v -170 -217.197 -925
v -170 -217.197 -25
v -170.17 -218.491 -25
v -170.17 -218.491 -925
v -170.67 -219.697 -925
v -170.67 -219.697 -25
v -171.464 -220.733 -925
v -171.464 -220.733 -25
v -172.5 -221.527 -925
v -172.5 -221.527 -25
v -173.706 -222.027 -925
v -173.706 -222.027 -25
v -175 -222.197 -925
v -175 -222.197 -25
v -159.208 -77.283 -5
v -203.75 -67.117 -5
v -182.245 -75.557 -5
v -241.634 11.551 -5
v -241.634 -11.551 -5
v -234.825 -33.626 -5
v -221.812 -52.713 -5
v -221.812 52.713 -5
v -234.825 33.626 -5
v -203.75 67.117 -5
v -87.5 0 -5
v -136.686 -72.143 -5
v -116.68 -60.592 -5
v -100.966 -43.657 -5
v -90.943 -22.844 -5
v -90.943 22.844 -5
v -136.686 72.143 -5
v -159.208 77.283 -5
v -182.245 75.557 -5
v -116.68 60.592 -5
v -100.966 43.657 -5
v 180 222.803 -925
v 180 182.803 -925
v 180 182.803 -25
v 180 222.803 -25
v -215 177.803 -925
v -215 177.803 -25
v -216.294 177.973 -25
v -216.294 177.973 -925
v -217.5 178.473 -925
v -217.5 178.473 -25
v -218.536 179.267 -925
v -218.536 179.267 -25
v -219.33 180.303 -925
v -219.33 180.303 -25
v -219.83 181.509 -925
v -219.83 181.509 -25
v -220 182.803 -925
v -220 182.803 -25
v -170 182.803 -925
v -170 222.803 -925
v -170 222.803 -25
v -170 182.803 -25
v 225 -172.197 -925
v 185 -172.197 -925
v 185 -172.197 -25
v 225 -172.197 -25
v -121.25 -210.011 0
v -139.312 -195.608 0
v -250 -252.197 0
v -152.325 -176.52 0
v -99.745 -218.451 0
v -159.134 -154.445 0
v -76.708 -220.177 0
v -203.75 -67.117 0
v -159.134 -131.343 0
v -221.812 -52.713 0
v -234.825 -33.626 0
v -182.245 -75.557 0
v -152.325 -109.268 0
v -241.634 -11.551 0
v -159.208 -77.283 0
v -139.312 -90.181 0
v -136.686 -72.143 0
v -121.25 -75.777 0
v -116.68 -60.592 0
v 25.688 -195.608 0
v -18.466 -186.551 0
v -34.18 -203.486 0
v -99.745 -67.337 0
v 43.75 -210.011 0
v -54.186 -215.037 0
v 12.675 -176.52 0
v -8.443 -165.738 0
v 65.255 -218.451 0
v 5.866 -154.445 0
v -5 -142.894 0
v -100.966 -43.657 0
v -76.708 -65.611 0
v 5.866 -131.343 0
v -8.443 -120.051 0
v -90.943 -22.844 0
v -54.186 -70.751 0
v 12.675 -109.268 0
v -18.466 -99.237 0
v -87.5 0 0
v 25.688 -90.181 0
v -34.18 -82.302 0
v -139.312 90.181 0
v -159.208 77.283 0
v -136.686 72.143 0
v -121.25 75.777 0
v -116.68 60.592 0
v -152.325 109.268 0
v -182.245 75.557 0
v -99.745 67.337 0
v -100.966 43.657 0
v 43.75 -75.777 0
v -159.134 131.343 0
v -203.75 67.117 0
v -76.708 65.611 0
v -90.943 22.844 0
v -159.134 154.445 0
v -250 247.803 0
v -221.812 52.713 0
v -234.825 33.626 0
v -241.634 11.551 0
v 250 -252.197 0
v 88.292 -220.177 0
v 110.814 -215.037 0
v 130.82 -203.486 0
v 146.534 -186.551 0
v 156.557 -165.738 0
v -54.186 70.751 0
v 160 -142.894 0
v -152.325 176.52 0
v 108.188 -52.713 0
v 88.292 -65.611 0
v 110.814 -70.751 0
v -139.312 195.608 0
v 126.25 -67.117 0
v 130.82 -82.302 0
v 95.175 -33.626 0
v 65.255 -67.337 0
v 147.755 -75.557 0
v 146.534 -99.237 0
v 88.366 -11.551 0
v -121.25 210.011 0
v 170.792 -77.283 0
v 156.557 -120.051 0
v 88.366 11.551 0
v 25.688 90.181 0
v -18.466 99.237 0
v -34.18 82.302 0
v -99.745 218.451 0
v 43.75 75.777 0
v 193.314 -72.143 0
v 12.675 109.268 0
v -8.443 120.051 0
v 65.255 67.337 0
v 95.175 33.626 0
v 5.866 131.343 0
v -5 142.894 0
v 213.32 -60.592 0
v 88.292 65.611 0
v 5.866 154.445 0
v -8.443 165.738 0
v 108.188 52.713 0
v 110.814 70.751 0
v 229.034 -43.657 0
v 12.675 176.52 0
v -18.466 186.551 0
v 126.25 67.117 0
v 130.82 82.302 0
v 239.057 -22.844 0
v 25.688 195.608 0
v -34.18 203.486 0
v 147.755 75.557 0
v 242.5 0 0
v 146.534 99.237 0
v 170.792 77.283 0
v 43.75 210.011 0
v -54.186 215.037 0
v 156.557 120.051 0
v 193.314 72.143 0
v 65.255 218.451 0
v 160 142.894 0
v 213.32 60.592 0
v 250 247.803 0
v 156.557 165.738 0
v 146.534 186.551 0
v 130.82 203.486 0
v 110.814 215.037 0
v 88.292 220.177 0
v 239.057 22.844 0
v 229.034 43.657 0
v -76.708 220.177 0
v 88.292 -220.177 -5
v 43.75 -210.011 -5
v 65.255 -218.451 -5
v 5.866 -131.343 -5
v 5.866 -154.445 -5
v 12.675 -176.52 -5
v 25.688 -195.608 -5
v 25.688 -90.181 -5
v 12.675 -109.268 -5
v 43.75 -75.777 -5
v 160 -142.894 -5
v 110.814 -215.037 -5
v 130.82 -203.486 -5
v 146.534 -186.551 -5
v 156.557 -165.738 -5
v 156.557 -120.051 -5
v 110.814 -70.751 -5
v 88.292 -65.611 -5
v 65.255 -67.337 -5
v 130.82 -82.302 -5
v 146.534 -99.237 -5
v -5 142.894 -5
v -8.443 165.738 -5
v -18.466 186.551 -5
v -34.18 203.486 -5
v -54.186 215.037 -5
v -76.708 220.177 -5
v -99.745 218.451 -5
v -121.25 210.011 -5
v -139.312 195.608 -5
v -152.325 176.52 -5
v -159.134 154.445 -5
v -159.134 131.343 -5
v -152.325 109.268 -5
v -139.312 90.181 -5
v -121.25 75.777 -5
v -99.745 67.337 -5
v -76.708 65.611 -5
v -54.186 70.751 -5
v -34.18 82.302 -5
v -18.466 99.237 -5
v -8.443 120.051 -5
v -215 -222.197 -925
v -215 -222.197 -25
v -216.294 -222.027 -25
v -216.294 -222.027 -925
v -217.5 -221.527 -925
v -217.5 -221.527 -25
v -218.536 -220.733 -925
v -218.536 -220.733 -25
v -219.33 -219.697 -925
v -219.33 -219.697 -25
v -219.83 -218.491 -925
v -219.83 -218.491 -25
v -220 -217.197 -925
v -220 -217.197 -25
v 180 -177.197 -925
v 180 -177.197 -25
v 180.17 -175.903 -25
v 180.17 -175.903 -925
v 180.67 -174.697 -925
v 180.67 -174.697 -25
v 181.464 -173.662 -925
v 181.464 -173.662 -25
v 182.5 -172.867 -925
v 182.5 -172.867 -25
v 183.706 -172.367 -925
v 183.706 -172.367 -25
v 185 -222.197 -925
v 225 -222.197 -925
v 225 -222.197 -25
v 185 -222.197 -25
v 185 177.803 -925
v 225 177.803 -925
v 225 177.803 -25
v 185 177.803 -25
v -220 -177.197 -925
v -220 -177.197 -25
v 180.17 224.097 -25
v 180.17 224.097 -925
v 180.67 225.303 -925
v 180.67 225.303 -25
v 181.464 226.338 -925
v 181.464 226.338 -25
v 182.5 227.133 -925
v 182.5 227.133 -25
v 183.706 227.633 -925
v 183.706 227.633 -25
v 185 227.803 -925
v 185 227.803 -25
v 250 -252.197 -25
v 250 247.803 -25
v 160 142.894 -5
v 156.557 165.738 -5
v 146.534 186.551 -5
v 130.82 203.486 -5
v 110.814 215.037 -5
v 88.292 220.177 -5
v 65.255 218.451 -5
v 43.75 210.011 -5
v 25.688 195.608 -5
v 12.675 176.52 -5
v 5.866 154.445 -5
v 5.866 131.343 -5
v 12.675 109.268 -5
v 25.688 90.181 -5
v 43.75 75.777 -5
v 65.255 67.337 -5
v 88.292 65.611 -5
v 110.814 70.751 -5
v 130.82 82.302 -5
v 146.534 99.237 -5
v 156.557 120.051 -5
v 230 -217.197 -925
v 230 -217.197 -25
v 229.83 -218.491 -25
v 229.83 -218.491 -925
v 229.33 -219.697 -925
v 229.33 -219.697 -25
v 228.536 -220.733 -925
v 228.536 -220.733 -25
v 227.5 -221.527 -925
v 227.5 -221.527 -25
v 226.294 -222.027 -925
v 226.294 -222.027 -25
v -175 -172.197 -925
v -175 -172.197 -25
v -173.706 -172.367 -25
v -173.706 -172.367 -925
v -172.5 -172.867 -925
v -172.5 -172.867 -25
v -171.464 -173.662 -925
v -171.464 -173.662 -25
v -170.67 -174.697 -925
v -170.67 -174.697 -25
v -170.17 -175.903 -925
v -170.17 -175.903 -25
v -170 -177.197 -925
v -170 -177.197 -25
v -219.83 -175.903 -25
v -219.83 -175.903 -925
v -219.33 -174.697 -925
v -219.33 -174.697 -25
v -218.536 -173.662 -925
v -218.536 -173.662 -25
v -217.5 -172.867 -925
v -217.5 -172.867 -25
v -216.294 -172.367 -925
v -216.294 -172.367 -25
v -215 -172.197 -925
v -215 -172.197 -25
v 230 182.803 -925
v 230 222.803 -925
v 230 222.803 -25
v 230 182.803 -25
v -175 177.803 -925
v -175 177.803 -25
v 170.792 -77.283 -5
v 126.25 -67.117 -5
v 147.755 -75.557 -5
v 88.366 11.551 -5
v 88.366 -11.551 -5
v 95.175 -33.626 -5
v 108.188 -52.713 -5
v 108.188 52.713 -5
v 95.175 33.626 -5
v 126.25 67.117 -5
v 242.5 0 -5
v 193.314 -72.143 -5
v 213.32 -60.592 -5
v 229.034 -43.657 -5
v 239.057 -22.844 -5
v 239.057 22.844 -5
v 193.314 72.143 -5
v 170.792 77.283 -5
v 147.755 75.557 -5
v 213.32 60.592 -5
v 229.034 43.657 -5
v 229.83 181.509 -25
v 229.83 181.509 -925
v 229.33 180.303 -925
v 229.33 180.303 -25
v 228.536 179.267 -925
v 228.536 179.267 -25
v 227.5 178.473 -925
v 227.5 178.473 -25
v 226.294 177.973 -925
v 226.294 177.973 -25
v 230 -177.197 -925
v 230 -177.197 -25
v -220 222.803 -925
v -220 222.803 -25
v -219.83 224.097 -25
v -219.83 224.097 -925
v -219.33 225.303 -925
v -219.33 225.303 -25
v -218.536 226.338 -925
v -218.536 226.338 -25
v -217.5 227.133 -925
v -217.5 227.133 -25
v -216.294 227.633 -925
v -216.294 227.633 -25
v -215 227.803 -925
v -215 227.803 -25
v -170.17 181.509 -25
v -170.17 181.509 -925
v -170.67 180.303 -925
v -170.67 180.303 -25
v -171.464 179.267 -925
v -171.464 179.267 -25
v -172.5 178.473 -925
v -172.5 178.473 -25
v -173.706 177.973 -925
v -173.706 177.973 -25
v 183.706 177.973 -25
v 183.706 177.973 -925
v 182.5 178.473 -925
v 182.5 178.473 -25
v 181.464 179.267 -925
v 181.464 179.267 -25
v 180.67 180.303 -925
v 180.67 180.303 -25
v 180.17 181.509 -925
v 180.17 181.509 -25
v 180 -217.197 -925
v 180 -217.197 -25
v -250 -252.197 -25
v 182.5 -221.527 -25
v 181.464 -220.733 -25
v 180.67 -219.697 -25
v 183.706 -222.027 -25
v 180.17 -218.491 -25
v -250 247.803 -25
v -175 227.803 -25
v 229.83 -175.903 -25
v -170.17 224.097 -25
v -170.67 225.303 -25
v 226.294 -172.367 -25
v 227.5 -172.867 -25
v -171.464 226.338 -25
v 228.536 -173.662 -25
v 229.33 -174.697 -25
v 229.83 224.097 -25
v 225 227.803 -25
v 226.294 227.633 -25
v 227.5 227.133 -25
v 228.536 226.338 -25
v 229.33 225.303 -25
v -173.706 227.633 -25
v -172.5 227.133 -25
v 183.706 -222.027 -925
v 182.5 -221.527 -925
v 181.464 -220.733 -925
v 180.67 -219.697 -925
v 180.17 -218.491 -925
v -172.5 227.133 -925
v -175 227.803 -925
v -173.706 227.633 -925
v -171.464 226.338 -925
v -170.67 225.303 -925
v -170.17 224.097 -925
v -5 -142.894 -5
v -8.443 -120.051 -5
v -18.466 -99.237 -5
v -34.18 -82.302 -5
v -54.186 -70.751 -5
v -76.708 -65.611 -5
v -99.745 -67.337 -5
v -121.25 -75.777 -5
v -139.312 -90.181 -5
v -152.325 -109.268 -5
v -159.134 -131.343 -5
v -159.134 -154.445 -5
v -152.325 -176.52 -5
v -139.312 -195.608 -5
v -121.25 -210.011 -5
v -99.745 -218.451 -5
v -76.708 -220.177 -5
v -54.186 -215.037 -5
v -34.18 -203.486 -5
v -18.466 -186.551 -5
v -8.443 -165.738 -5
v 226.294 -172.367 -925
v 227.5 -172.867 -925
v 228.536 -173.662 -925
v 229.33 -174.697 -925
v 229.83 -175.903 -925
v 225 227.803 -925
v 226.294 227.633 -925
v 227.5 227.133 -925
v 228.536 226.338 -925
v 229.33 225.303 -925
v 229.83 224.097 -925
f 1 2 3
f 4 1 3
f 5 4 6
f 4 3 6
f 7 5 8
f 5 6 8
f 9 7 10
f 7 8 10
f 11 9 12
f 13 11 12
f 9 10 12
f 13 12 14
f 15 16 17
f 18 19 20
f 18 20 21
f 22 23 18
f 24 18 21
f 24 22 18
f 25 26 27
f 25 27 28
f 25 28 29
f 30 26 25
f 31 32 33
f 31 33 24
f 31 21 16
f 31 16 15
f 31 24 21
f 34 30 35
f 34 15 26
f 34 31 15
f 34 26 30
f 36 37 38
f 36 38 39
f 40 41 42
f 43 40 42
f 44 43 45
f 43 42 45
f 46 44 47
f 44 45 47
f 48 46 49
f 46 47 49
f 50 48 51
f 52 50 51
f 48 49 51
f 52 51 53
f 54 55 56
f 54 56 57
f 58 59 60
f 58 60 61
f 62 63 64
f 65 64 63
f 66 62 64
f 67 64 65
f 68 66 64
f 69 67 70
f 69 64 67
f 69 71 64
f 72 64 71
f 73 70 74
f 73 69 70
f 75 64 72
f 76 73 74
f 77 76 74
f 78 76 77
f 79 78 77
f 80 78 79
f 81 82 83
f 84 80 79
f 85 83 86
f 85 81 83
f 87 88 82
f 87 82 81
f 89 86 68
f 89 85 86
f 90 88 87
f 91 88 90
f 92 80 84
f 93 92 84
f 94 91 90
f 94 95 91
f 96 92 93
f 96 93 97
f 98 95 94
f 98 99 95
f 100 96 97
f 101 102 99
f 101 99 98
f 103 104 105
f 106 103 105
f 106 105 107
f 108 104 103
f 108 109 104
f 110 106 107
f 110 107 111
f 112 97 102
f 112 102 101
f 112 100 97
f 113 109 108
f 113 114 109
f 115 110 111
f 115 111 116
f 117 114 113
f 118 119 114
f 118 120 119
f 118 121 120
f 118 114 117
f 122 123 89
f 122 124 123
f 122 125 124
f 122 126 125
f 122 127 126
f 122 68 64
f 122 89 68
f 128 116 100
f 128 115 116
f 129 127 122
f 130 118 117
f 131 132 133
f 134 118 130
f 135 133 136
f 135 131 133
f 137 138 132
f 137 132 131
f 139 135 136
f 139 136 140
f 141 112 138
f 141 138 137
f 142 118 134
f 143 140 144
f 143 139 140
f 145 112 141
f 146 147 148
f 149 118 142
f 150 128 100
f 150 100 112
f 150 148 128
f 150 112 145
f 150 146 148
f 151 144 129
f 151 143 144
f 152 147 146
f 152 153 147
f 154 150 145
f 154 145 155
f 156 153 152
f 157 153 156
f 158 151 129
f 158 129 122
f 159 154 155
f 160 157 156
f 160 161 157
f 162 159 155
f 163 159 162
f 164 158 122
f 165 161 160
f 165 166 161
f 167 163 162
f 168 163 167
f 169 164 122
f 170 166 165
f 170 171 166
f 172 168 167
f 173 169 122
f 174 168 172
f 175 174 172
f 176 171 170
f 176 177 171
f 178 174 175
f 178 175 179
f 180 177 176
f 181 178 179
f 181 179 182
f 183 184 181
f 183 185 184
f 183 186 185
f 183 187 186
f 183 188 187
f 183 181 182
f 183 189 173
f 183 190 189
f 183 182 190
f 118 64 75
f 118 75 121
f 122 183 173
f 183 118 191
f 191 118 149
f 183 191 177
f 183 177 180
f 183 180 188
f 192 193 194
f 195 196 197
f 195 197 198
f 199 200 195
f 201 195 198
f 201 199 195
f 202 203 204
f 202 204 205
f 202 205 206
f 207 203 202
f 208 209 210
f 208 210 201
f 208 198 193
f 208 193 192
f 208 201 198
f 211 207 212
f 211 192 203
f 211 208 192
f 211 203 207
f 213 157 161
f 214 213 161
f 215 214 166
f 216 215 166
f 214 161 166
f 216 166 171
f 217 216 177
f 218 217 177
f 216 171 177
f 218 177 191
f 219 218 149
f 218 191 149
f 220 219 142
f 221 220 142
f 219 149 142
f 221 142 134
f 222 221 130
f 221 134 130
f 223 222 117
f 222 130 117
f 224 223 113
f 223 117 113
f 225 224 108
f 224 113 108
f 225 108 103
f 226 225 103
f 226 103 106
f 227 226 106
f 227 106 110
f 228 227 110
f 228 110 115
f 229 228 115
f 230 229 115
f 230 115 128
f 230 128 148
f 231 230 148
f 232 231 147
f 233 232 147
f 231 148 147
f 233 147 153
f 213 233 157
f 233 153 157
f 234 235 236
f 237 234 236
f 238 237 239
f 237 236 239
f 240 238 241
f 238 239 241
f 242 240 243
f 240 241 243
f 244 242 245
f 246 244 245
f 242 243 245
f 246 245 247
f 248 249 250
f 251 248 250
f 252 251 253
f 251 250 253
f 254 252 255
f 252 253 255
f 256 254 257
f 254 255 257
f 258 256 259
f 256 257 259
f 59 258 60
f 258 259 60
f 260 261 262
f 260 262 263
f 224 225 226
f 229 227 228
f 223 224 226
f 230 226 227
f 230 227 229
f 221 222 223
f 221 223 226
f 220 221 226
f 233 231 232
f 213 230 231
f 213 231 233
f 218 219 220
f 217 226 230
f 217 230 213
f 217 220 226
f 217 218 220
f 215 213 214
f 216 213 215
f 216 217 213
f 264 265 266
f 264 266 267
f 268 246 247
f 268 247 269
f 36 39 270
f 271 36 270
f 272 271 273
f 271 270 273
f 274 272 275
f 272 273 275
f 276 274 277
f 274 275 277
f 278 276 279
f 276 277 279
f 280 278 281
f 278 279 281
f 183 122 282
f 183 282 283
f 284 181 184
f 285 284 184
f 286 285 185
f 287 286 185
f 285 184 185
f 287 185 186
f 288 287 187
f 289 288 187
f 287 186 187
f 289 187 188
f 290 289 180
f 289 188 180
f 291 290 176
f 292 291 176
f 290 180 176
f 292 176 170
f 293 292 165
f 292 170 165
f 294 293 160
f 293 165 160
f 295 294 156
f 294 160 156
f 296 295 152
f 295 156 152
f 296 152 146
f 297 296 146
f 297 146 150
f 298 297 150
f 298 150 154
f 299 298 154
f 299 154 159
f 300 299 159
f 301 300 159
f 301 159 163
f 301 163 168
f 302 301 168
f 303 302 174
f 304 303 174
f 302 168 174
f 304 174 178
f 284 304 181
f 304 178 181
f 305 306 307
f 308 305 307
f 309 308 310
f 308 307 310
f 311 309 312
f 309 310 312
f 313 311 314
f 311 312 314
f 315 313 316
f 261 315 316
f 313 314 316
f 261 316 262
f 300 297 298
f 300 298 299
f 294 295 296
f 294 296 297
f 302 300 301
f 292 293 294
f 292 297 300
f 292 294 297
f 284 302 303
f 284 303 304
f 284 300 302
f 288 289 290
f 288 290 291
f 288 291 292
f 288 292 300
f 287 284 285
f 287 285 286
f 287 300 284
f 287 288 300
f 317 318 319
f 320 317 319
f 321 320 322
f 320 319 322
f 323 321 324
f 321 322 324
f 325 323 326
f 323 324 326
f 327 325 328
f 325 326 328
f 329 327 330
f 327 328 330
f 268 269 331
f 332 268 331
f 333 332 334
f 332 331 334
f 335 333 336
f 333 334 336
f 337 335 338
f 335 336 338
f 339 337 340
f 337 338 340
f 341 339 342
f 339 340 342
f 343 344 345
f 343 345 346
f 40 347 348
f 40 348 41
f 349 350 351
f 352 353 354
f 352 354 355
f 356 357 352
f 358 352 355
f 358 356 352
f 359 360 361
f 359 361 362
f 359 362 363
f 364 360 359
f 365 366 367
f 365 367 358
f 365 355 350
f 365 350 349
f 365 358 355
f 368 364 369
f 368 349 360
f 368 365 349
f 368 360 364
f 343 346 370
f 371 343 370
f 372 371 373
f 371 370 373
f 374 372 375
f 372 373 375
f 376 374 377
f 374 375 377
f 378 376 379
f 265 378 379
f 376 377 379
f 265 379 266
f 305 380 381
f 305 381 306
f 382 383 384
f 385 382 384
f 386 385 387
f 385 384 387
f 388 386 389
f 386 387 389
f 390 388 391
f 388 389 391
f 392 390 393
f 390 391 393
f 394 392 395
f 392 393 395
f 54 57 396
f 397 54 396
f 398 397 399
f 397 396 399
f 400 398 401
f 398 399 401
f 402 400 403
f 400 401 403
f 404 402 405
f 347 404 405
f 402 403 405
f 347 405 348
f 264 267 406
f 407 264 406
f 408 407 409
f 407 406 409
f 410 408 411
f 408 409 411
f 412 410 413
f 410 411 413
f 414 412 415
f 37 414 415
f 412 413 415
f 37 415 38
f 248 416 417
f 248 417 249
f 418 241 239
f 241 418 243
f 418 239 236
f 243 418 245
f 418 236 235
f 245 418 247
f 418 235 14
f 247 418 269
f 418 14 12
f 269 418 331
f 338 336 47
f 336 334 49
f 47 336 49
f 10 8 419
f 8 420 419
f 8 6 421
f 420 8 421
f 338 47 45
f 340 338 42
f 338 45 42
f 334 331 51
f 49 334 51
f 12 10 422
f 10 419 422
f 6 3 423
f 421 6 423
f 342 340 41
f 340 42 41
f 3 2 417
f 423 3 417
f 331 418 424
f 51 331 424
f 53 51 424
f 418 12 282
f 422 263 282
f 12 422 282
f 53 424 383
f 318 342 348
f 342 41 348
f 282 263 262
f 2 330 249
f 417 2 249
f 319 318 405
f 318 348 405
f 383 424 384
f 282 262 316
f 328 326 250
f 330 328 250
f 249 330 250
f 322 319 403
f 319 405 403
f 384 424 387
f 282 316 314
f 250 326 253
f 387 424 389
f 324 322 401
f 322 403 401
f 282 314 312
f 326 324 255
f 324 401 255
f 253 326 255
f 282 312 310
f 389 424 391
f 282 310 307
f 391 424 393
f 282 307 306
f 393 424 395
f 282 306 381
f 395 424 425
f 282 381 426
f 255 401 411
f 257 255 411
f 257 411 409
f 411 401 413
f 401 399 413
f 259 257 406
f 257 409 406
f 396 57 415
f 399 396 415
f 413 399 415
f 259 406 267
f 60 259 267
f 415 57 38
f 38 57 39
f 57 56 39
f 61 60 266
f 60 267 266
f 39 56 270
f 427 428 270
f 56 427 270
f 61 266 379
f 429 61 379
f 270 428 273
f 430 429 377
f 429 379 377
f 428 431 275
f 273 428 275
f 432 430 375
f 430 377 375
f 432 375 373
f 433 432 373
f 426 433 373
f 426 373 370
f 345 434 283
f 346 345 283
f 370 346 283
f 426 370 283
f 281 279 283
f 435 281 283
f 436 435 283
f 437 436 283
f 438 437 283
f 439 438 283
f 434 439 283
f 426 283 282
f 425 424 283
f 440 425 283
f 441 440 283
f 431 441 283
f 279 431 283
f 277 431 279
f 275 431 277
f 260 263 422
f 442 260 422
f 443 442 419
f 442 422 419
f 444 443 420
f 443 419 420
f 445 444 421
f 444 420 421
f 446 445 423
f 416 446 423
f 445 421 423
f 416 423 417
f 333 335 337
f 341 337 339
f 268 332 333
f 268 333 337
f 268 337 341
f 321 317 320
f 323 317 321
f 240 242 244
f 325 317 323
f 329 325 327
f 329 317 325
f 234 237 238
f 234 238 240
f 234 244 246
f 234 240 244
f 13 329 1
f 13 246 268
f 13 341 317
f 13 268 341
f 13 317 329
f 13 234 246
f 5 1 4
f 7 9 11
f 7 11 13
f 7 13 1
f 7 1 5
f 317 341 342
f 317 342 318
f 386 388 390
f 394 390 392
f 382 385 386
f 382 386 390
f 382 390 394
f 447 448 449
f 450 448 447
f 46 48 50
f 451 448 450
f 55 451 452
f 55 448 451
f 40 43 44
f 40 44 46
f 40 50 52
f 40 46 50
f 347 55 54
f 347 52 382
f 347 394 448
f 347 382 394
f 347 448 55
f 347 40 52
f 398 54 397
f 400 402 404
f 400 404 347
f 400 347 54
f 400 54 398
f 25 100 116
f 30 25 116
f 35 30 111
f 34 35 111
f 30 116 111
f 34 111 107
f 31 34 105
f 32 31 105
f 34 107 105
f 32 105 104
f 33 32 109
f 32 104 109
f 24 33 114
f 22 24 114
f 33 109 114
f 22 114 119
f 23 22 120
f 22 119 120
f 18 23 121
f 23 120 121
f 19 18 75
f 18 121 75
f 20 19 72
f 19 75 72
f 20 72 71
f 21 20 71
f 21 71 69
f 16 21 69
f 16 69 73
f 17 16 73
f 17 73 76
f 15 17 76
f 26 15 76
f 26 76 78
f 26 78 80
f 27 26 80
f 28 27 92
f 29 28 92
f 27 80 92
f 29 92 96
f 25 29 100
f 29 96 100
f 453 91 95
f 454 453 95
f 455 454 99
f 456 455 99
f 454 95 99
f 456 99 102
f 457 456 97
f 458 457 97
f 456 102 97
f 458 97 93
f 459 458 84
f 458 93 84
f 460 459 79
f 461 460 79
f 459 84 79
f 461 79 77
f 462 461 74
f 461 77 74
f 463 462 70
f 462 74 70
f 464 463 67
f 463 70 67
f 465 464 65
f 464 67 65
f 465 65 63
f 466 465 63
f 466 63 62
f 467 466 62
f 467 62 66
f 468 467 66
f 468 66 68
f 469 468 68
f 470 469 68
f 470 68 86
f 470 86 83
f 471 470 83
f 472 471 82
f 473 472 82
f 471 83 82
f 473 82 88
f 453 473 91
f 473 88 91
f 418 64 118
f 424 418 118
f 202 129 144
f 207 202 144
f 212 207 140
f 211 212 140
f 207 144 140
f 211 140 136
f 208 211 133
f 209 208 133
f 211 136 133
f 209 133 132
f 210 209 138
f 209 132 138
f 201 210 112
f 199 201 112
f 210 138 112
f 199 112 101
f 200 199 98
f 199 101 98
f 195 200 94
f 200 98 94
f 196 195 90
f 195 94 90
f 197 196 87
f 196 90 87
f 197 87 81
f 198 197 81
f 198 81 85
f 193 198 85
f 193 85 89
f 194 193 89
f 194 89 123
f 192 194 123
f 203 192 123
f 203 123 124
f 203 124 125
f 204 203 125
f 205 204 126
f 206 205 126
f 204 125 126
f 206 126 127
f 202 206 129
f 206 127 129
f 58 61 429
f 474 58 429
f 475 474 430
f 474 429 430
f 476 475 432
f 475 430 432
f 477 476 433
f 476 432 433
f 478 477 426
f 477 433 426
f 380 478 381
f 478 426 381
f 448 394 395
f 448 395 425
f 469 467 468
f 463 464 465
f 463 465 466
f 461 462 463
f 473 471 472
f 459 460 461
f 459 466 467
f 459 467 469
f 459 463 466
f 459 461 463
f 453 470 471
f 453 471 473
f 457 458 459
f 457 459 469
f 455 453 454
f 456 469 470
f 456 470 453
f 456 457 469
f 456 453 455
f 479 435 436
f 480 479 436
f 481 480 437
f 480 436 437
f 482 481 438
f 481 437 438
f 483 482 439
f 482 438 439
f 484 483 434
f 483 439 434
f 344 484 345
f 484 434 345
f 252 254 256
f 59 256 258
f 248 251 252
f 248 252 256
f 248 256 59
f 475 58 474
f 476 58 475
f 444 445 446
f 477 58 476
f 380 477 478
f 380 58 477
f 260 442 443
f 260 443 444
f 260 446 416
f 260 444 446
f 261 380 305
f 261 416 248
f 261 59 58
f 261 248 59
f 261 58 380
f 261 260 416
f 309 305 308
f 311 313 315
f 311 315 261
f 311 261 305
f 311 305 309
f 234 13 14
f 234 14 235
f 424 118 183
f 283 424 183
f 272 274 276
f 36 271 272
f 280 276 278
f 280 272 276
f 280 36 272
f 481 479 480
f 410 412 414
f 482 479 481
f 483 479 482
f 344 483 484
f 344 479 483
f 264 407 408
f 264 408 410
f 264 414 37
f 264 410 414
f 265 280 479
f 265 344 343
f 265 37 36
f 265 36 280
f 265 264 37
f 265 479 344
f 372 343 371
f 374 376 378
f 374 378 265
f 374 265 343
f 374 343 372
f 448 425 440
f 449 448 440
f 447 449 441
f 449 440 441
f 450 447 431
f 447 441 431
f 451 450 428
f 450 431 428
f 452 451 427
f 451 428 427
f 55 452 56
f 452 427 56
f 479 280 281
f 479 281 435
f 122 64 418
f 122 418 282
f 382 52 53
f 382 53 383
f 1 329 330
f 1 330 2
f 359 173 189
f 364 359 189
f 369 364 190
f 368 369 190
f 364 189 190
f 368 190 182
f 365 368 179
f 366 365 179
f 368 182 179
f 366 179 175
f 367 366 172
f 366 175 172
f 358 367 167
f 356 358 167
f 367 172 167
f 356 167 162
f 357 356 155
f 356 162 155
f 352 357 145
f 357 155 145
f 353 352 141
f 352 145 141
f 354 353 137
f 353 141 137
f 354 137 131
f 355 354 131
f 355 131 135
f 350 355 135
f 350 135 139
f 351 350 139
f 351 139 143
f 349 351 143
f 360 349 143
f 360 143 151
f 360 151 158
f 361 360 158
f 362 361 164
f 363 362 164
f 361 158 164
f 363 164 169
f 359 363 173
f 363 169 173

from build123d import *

# Parameters (mm, degrees)
F0_W     = 500
F0_H     = 500
F0_R     = 77.5
F1_DEPTH = 25
F2_DEPTH = 5
F4_DEPTH = 900


with BuildPart() as f1:
    # F0 (on Top) → F1 (new body)
    with BuildSketch(Plane.XY):
        with Locations((0, -2.197117)):
            Rectangle(F0_W, F0_H)
        with Locations((-82.5, -142.894192)):
            Circle(F0_R, mode=Mode.SUBTRACT)
        with Locations((82.5, -142.894192)):
            Circle(F0_R, mode=Mode.SUBTRACT)
        with Locations((-165, 0)):
            Circle(F0_R, mode=Mode.SUBTRACT)
        with Locations((-82.5, 142.894192)):
            Circle(F0_R, mode=Mode.SUBTRACT)
        with Locations((165, 0)):
            Circle(F0_R, mode=Mode.SUBTRACT)
        with Locations((82.5, 142.894192)):
            Circle(F0_R, mode=Mode.SUBTRACT)
        with Locations((-82.5, 142.894192)):
            Circle(F0_R)
        with Locations((82.5, 142.894192)):
            Circle(F0_R)
        with Locations((165, 0)):
            Circle(F0_R)
        with Locations((-165, 0)):
            Circle(F0_R)
        with Locations((-82.5, -142.894192)):
            Circle(F0_R)
        with Locations((82.5, -142.894192)):
            Circle(F0_R)
    extrude(amount=-F1_DEPTH)

    # F0 (on Top) → F2 (cut)
    with BuildSketch(Plane.XY):
        with Locations((-82.5, 142.894192)):
            Circle(F0_R)
        with Locations((82.5, 142.894192)):
            Circle(F0_R)
        with Locations((165, 0)):
            Circle(F0_R)
        with Locations((82.5, -142.894192)):
            Circle(F0_R)
        with Locations((-82.5, -142.894192)):
            Circle(F0_R)
        with Locations((-165, 0)):
            Circle(F0_R)
    extrude(amount=-F2_DEPTH, mode=Mode.SUBTRACT)

    # F3 (on face) → F4 (join)
    with BuildSketch(Plane(origin=(0, 0, -25), x_dir=(1, 0, 0), z_dir=(0, 0, -1))):
        with BuildLine():
            ThreePointArc((225, 172.197117), (228.535534, 173.661583), (230, 177.197117))
            Line((230, 177.197117), (230, 217.197117))
            ThreePointArc((230, 217.197117), (228.535534, 220.732651), (225, 222.197117))
            Line((225, 222.197117), (185, 222.197117))
            ThreePointArc((185, 222.197117), (181.464466, 220.732651), (180, 217.197117))
            Line((180, 217.197117), (180, 177.197117))
            ThreePointArc((180, 177.197117), (181.464466, 173.661583), (185, 172.197117))
            Line((185, 172.197117), (225, 172.197117))
        make_face()
        with BuildLine():
            ThreePointArc((-175, 172.197117), (-171.464466, 173.661583), (-170, 177.197117))
            Line((-170, 177.197117), (-170, 217.197117))
            ThreePointArc((-170, 217.197117), (-171.464466, 220.732651), (-175, 222.197117))
            Line((-175, 222.197117), (-215, 222.197117))
            ThreePointArc((-215, 222.197117), (-218.535534, 220.732651), (-220, 217.197117))
            Line((-220, 217.197117), (-220, 177.197117))
            ThreePointArc((-220, 177.197117), (-218.535534, 173.661583), (-215, 172.197117))
            Line((-215, 172.197117), (-175, 172.197117))
        make_face()
        with BuildLine():
            ThreePointArc((-175, -227.802883), (-171.464466, -226.338417), (-170, -222.802883))
            Line((-170, -222.802883), (-170, -182.802883))
            ThreePointArc((-170, -182.802883), (-171.464466, -179.267349), (-175, -177.802883))
            Line((-175, -177.802883), (-215, -177.802883))
            ThreePointArc((-215, -177.802883), (-218.535534, -179.267349), (-220, -182.802883))
            Line((-220, -182.802883), (-220, -222.802883))
            ThreePointArc((-220, -222.802883), (-218.535534, -226.338417), (-215, -227.802883))
            Line((-215, -227.802883), (-175, -227.802883))
        make_face()
        with BuildLine():
            Line((185, -227.802883), (225, -227.802883))
            ThreePointArc((225, -227.802883), (228.535534, -226.338417), (230, -222.802883))
            Line((230, -222.802883), (230, -182.802883))
            ThreePointArc((230, -182.802883), (228.535534, -179.267349), (225, -177.802883))
            Line((225, -177.802883), (185, -177.802883))
            ThreePointArc((185, -177.802883), (181.464466, -179.267349), (180, -182.802883))
            Line((180, -182.802883), (180, -222.802883))
            ThreePointArc((180, -222.802883), (181.464466, -226.338417), (185, -227.802883))
        make_face()
    extrude(amount=F4_DEPTH)


solid = f1.part
